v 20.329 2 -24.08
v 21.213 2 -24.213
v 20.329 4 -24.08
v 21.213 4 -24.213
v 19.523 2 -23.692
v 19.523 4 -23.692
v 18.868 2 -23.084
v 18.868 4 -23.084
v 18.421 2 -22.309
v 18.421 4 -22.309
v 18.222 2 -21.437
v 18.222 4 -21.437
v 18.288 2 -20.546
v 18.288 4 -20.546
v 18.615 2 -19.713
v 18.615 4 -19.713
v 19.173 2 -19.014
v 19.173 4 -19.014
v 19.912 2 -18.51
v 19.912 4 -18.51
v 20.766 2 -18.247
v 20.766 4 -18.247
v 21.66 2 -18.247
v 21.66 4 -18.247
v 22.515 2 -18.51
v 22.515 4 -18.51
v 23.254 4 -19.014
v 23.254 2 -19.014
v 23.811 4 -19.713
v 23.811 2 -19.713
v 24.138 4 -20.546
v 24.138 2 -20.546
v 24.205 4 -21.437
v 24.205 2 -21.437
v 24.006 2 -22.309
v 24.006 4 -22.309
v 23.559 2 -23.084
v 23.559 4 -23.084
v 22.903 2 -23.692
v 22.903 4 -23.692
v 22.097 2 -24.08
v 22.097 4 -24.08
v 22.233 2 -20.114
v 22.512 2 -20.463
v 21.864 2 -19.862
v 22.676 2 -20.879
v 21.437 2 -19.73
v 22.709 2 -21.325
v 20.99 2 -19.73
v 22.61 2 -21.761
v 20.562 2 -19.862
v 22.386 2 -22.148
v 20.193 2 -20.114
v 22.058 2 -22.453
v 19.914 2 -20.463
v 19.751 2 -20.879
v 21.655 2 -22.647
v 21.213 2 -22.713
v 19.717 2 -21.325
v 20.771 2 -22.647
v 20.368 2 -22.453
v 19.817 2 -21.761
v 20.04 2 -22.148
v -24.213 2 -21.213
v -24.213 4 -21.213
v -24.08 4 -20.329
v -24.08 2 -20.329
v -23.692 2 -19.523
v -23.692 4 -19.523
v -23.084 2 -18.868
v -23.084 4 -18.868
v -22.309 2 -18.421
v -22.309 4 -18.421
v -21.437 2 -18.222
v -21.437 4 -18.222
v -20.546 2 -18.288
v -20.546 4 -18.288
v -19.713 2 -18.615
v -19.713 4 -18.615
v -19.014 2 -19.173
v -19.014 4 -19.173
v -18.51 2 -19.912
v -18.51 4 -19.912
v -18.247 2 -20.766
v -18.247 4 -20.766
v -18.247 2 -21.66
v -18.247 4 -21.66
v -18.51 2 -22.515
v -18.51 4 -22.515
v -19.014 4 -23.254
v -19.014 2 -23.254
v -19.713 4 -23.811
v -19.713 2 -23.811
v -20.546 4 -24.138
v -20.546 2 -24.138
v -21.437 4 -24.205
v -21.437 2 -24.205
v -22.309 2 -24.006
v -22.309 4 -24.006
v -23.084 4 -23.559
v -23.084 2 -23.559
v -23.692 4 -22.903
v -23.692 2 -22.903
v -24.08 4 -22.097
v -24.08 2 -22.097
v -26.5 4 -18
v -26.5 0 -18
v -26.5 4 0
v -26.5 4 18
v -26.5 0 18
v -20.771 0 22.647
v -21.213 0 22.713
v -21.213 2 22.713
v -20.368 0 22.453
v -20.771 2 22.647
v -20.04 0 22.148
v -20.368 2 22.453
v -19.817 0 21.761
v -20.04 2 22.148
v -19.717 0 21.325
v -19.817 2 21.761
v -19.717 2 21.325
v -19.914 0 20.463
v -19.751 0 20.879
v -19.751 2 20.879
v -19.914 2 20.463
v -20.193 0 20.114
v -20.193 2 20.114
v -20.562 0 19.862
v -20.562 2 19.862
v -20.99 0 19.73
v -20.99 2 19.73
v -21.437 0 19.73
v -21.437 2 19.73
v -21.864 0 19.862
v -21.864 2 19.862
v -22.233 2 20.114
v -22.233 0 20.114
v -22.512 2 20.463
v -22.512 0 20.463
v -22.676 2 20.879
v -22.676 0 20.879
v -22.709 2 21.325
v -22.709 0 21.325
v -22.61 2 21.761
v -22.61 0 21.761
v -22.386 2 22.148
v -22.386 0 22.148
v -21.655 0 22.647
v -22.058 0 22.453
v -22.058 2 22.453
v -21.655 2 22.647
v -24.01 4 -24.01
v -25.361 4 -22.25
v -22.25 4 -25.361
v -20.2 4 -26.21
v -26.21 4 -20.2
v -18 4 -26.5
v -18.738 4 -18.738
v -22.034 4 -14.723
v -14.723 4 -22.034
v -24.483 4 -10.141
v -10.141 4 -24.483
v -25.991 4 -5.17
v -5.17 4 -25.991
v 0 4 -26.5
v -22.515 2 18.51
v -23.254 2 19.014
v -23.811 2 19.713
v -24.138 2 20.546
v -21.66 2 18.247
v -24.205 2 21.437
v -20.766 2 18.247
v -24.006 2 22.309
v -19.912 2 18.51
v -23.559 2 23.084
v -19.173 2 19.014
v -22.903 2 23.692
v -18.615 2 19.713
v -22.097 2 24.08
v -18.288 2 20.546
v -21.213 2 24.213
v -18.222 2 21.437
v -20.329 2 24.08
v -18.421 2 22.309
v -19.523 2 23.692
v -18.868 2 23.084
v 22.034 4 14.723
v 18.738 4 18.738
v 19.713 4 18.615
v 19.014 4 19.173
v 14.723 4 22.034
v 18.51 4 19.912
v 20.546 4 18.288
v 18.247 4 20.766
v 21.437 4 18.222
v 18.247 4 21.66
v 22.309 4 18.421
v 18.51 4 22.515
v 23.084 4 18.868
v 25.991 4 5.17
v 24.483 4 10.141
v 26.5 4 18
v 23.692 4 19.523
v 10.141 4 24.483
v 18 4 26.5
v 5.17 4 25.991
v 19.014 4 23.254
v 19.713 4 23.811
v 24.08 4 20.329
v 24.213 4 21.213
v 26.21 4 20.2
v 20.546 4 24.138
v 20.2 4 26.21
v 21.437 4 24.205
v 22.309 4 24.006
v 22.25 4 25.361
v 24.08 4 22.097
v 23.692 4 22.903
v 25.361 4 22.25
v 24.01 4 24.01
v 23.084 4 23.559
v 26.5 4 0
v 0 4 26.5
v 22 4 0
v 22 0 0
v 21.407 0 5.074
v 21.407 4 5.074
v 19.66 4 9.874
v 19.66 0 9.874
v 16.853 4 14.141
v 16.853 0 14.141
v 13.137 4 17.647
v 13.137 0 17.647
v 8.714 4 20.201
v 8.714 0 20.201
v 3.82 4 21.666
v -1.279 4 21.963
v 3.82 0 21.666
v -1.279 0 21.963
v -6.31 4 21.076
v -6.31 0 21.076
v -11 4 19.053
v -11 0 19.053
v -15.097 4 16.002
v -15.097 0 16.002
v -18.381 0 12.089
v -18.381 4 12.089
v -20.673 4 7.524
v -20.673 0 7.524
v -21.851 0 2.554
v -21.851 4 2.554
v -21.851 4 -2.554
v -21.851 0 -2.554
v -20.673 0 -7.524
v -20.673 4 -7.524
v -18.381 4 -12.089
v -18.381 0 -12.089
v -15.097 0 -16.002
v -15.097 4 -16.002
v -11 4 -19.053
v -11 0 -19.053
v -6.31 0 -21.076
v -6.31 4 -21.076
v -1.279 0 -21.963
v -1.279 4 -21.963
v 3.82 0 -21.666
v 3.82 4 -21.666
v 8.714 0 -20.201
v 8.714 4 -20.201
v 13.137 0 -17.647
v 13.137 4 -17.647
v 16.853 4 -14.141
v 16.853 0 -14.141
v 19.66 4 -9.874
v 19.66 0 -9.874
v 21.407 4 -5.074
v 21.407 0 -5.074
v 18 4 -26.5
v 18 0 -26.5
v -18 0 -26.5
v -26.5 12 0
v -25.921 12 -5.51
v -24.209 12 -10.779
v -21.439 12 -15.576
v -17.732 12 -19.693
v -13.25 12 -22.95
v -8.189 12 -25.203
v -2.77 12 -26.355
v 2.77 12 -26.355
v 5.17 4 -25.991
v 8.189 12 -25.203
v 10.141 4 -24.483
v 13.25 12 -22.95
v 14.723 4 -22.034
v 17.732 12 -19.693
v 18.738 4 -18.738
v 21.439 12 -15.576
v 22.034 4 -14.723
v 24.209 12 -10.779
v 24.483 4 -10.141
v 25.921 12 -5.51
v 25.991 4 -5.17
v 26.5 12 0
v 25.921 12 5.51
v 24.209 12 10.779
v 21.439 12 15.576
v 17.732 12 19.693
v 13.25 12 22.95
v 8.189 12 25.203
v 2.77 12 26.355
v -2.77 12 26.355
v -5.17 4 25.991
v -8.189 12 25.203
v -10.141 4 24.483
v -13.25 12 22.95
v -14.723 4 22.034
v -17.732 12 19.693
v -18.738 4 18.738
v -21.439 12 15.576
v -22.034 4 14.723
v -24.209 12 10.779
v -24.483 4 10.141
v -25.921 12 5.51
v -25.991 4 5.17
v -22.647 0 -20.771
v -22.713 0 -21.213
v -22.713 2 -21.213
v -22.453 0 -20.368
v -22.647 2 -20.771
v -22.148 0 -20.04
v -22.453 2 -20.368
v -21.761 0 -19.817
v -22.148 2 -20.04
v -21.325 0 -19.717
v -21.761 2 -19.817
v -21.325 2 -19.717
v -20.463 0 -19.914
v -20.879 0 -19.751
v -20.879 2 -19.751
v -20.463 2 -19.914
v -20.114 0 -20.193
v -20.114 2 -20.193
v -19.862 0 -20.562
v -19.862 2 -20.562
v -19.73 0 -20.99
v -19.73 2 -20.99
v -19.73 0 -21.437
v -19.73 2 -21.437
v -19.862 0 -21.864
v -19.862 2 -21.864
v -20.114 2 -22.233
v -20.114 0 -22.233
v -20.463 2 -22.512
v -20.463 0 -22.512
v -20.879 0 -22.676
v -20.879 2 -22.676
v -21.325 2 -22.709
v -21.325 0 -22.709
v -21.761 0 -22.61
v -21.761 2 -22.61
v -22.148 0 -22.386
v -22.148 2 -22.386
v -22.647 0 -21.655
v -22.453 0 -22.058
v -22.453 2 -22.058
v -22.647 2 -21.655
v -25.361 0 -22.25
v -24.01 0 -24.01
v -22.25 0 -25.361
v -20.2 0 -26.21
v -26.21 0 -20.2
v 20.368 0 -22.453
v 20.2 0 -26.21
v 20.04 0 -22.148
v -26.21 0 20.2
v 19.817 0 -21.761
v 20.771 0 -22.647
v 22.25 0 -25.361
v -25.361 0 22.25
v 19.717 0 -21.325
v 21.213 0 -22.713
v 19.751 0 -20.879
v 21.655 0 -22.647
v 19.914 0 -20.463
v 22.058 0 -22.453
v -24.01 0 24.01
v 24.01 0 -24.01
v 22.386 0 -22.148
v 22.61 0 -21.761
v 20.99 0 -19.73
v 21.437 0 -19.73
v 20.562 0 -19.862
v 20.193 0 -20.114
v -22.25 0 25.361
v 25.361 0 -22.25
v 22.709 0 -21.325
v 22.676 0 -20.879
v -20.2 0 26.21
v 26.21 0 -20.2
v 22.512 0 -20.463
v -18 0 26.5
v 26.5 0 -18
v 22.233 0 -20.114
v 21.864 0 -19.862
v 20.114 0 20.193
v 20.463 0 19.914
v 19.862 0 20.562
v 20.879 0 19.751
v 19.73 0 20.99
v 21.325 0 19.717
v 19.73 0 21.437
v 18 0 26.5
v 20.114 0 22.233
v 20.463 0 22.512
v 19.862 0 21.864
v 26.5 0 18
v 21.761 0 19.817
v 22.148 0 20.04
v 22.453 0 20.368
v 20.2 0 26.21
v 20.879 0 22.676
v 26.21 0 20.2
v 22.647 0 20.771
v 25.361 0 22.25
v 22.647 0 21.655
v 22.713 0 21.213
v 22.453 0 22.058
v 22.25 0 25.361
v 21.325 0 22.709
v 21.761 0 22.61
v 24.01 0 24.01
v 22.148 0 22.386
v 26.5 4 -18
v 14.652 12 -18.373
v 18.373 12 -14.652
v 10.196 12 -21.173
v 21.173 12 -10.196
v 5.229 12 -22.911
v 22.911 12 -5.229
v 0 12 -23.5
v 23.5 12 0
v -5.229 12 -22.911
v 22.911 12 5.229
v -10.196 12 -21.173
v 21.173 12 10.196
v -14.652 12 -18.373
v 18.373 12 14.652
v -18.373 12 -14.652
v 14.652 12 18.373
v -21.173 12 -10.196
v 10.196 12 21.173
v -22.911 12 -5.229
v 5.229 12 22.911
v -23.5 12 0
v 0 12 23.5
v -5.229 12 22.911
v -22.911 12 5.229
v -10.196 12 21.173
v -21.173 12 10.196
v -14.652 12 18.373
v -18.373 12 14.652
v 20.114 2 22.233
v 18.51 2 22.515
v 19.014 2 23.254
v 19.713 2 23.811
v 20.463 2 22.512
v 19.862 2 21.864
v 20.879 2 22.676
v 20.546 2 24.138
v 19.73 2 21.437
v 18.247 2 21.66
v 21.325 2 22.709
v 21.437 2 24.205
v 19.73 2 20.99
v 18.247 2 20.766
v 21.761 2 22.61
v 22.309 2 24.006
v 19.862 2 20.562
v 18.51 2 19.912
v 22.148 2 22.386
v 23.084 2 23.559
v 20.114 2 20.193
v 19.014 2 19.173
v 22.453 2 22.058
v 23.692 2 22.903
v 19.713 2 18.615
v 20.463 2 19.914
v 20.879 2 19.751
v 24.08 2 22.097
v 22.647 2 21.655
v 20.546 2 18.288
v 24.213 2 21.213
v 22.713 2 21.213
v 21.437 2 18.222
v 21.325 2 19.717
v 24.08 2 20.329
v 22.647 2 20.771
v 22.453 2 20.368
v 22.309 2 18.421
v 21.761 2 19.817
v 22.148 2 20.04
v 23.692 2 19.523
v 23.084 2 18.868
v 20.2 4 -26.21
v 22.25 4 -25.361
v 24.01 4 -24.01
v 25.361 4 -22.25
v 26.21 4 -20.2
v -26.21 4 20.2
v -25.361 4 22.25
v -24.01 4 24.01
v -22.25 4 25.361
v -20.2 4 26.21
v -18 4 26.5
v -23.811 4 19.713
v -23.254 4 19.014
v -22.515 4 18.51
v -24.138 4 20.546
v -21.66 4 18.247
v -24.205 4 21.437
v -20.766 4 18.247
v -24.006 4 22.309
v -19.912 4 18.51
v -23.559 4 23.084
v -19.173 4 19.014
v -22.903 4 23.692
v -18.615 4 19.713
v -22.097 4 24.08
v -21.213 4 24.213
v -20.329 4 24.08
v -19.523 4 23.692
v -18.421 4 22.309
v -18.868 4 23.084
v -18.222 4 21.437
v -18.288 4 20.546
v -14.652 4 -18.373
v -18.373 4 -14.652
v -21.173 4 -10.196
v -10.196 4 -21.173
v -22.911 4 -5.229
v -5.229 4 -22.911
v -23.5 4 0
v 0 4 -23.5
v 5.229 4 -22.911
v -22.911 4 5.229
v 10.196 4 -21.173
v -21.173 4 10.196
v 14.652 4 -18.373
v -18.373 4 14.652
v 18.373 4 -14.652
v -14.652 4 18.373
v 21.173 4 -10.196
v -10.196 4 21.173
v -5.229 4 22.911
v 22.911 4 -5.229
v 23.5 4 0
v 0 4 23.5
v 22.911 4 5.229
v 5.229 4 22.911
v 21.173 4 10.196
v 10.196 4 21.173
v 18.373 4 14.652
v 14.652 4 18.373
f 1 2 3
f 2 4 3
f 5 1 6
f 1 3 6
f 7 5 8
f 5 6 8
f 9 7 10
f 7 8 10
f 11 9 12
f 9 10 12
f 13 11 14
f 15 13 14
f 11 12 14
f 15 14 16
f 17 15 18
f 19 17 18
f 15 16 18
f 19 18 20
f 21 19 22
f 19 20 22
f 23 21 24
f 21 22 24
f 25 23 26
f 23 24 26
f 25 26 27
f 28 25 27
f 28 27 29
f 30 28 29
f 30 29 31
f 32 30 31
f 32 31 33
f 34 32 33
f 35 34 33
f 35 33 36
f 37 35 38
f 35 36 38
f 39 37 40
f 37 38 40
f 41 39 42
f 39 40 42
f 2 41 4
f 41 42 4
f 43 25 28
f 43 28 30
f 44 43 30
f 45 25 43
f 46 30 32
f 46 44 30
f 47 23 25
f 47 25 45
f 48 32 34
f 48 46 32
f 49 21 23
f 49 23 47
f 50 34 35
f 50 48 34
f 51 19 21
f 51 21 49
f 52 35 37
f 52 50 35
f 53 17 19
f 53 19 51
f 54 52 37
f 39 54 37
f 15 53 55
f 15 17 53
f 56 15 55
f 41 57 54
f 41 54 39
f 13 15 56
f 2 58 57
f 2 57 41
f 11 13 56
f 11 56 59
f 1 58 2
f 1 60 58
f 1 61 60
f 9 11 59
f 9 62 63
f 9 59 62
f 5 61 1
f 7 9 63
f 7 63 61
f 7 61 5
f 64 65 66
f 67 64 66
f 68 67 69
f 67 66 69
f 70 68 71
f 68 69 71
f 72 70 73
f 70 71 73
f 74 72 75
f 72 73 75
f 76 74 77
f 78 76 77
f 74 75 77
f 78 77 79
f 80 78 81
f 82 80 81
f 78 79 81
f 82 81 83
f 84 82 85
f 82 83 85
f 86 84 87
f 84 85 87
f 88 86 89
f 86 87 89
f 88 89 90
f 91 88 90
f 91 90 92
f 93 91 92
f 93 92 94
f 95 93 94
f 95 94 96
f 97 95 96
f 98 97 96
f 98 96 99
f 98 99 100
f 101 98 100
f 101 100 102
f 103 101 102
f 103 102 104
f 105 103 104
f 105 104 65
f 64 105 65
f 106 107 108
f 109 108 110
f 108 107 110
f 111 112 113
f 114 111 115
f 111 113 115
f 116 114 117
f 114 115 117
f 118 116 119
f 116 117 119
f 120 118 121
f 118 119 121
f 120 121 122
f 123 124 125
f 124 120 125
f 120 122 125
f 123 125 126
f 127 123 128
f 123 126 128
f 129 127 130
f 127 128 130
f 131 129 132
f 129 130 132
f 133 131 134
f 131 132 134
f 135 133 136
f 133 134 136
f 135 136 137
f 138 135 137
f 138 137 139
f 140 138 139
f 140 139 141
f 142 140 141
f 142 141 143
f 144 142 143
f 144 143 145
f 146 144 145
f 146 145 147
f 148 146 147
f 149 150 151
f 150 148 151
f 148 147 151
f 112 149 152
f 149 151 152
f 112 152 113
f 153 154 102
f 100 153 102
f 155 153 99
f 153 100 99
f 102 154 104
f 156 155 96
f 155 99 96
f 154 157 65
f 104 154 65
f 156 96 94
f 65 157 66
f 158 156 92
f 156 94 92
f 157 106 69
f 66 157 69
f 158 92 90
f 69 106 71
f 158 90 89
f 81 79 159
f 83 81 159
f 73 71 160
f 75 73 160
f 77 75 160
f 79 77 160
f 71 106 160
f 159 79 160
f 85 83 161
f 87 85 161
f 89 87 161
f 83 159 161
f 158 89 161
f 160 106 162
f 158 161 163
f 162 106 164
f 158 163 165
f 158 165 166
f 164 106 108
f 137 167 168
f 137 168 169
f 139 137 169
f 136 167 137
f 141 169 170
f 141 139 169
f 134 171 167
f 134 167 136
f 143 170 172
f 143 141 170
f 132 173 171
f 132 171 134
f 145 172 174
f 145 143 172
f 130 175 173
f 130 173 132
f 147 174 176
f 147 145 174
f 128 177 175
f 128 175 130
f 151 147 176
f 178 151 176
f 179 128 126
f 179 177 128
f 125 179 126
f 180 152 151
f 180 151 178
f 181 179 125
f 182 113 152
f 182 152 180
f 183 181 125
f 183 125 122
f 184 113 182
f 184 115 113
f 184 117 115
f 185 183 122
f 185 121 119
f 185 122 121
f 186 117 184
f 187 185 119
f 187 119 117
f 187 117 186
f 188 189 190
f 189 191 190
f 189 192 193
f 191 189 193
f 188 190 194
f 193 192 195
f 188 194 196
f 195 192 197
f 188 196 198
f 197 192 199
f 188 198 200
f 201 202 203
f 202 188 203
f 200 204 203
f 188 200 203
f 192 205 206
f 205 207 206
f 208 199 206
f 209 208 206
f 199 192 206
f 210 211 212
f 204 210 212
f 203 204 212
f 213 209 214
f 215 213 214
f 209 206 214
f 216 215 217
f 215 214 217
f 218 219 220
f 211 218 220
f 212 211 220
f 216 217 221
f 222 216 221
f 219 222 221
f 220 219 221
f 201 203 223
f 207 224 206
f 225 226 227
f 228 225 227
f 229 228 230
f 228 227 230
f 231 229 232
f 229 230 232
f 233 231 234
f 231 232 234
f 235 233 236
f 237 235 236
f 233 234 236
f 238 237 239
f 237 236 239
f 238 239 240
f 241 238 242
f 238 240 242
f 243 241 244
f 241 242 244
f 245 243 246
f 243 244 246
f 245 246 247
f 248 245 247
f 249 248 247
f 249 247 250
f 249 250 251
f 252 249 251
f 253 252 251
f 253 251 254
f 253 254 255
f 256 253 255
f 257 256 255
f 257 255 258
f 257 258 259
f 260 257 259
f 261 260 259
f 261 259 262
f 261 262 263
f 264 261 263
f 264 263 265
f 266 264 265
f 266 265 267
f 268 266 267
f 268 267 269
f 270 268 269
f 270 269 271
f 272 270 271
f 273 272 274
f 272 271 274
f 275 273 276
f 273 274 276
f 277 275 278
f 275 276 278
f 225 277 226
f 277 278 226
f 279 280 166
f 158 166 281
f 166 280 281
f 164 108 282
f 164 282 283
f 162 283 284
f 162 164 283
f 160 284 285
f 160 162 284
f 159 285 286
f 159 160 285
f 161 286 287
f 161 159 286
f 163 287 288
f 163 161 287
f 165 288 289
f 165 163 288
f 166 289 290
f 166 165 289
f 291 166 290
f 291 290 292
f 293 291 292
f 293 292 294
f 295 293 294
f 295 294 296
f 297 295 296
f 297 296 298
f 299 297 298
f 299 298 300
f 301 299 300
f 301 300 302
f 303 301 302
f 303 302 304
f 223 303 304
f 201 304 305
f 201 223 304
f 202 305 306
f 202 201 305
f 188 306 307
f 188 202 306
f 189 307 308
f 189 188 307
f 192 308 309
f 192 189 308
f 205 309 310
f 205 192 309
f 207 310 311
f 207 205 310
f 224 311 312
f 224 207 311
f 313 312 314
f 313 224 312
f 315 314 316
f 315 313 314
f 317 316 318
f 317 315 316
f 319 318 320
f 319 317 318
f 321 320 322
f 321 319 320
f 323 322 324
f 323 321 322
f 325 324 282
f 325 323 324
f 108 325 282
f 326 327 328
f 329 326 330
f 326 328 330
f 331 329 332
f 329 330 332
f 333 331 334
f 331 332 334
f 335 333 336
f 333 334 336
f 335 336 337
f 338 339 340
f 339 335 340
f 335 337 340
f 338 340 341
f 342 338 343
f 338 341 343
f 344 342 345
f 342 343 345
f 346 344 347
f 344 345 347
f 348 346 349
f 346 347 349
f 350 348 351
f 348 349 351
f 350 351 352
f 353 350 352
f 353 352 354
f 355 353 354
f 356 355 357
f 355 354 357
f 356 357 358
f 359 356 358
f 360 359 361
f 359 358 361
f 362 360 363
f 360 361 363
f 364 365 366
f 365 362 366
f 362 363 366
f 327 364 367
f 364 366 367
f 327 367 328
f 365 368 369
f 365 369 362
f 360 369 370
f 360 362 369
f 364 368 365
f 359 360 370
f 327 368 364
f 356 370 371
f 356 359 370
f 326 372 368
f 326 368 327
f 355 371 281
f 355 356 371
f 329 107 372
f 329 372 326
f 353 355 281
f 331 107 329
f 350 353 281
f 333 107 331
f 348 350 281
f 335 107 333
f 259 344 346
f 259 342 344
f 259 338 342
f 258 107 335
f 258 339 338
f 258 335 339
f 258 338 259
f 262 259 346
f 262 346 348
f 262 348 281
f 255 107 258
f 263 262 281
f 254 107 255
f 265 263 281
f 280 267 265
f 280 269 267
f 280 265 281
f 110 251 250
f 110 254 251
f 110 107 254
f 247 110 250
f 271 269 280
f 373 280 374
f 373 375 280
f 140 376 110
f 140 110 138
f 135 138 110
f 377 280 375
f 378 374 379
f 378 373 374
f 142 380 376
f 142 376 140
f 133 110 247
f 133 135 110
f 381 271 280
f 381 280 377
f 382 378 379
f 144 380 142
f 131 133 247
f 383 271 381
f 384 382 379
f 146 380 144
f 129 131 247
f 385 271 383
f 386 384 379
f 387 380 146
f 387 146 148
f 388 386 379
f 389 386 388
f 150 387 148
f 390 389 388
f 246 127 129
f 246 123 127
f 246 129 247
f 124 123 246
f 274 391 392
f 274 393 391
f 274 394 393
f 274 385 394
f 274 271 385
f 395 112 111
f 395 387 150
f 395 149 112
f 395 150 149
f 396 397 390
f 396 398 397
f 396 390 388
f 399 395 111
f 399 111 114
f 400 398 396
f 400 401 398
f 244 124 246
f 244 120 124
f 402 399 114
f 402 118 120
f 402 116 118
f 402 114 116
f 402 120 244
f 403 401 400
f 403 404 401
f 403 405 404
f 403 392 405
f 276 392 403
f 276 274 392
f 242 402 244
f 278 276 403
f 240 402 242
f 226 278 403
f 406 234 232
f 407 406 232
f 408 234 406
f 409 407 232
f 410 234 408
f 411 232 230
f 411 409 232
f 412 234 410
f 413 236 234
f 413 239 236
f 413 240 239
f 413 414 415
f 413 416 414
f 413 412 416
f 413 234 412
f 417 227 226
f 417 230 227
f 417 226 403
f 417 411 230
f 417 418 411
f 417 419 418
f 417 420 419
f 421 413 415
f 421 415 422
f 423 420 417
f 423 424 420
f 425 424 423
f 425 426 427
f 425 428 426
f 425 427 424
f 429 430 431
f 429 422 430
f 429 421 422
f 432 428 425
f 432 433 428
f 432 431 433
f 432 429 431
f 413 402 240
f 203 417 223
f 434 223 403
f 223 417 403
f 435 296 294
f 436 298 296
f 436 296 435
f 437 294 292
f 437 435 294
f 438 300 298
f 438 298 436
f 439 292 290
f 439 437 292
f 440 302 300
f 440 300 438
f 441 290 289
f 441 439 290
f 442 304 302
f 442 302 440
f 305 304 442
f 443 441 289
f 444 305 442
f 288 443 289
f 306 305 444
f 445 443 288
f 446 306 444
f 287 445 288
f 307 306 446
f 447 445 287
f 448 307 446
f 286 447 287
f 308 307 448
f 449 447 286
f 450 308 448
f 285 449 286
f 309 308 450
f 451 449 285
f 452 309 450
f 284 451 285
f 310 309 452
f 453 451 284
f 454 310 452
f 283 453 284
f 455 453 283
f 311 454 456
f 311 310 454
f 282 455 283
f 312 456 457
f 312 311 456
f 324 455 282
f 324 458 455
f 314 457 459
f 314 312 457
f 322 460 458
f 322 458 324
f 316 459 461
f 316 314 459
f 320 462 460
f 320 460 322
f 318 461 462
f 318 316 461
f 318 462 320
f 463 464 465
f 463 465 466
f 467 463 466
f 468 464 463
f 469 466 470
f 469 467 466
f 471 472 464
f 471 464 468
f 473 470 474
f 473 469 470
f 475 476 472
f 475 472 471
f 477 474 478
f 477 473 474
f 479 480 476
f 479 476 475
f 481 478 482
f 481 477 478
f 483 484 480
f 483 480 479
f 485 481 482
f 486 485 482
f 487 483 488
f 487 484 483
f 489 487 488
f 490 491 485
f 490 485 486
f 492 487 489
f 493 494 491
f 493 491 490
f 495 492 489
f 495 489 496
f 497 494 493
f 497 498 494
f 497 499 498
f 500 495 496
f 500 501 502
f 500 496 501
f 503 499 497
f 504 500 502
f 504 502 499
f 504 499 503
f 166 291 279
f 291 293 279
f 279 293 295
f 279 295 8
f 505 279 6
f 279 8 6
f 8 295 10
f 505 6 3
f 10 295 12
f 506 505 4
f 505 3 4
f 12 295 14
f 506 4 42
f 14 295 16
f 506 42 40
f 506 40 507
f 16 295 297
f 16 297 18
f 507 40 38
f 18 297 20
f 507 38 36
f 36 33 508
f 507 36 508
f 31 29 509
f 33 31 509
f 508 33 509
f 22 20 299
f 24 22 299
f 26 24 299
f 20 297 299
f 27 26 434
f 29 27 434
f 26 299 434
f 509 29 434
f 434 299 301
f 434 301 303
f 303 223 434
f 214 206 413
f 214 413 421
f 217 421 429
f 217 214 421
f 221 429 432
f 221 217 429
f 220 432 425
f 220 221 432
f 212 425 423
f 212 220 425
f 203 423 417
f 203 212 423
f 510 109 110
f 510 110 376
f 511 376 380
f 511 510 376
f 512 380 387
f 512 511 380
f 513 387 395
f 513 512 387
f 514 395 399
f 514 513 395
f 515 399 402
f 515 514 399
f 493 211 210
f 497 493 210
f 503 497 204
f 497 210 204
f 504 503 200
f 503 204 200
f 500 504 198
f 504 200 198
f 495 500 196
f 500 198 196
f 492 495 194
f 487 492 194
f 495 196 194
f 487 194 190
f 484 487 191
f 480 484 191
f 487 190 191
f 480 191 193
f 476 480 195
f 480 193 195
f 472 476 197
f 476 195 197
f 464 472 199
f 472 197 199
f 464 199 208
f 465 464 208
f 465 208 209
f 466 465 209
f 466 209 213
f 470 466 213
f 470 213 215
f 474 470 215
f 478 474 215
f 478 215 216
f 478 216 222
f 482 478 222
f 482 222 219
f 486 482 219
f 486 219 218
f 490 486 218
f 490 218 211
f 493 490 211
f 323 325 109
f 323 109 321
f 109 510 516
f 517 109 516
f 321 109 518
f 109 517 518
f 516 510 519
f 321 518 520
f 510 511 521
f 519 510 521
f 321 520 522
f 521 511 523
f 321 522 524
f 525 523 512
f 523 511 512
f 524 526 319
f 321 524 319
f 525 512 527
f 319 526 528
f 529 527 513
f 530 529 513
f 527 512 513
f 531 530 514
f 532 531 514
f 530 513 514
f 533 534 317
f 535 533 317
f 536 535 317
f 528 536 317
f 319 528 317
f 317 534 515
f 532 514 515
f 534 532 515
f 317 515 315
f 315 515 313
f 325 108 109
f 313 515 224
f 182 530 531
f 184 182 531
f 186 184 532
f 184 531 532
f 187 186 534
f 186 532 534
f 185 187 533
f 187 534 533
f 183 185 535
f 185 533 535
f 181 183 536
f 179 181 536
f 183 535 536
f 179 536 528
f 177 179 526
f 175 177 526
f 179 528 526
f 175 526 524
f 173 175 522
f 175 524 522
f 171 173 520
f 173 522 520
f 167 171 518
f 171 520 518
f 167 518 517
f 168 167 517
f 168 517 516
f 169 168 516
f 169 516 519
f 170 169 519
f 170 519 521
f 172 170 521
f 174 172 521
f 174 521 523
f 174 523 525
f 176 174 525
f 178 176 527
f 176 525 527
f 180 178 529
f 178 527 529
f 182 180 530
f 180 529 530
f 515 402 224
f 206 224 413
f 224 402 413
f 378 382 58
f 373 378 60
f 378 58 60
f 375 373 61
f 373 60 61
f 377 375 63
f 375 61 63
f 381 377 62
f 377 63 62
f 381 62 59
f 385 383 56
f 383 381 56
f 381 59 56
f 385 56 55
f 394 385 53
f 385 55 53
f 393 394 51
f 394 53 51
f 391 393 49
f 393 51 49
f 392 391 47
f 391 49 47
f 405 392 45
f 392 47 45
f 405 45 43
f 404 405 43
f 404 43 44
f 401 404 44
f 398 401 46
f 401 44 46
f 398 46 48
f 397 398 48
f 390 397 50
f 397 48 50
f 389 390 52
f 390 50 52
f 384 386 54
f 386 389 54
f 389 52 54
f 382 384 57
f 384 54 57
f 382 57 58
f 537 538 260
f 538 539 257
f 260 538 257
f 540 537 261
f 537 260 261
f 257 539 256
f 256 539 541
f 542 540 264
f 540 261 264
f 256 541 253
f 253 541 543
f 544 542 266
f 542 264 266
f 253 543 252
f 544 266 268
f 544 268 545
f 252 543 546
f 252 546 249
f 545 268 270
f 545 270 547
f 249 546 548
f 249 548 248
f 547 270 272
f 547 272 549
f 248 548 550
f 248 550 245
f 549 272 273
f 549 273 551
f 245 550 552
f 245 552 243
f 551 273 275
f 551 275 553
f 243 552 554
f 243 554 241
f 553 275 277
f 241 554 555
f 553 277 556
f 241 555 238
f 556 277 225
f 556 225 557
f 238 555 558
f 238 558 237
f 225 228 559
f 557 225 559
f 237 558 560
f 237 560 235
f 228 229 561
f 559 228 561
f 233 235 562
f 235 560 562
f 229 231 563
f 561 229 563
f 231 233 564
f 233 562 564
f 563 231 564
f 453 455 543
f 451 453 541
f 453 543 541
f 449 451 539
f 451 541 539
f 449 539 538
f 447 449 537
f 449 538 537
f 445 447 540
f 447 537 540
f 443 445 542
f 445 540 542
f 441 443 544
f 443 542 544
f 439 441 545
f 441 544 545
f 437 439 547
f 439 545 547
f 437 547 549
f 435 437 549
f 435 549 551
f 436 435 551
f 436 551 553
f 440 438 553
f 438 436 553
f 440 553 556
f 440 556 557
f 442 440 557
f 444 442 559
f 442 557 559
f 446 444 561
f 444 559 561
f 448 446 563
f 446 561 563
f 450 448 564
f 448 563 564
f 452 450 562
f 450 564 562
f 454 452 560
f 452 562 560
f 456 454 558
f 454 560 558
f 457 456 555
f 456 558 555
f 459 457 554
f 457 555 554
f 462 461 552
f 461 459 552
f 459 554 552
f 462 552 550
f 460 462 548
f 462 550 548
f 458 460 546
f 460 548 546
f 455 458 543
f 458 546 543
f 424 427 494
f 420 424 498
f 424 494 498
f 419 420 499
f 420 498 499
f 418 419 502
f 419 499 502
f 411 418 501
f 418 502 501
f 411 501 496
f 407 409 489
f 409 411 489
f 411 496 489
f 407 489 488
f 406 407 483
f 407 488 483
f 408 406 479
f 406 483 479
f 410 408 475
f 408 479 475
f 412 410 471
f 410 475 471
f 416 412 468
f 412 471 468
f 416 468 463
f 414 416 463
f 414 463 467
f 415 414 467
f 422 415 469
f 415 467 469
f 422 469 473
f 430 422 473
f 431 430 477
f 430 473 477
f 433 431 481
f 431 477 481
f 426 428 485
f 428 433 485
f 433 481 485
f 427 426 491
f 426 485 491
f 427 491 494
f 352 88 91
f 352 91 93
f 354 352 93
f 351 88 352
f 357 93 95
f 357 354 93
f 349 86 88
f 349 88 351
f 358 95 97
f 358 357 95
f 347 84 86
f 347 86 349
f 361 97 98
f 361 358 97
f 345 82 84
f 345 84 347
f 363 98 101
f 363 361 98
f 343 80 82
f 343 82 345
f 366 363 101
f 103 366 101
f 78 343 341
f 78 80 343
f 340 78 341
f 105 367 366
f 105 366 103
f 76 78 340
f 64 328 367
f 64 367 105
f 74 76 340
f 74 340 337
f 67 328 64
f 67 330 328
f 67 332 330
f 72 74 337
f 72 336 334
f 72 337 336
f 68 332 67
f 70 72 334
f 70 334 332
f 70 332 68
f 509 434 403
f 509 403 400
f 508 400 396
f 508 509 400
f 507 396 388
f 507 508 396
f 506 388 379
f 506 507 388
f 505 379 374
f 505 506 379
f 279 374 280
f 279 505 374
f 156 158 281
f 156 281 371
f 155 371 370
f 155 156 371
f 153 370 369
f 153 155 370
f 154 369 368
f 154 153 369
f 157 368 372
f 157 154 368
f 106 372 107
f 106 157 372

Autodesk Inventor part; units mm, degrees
ref_plane "YZ Plane" through (0, 0, 0) normal (1, 0, 0) x (0, 1, 0)
ref_plane "XZ Plane" through (0, 0, 0) normal (0, 1, 0) x (-1, 0, 0)
ref_plane "XY Plane" through (0, 0, 0) normal (0, 0, 1) x (1, 0, 0)
sketch "Эскиз1" plane through (0, 0, 0) normal (0, 1, 0) x (-1, 0, 0)
  circle A0 centre (0, 0) radius 22
  circle A1 centre (0, 0) radius 23.5
  circle A2 centre (0, 0) radius 26.5
  dimension "d0" = 44
  dimension "d1" = 47
  dimension "d2" = 53
extrude "Выдавливание1" add sketch "Эскиз1" along normal blind 12 contours A2
sketch "Эскиз2" plane through (0, 0, 0) normal (0, -1, 0) x (1, 0, 0)
  circle A0 centre (0, 0) radius 22
  circle A1 centre (0, 0) radius 23.5
  circle A2 centre (0, 0) radius 26.5
  dimension "d5" = 44
  dimension "d6" = 47
  dimension "d7" = 53
extrude "Выдавливание2" add sketch "Эскиз2" against normal blind 4 contours A1
sketch "Эскиз3" plane through (0, 0, 0) normal (0, -1, 0) x (1, 0, 0)
  circle A0 centre (0, 0) radius 22
  circle A1 centre (0, 0) radius 23.5
  circle A2 centre (0, 0) radius 26.5
  line L0 (-26.5, 26.5) -> (26.5, 26.5)
  line L1 (26.5, 26.5) -> (26.5, -26.5)
  line L2 (26.5, -26.5) -> (-26.5, -26.5)
  line L3 (-26.5, -26.5) -> (-26.5, 26.5)
  line L4 (-26.5, 26.5) -> (26.5, -26.5) construction
  line L5 (26.5, 26.5) -> (-26.5, -26.5) construction
  dimension "d10" = 44
  dimension "d11" = 47
  dimension "d12" = 53
  dimension "d13" = 53
  dimension "d14" = 53
extrude "Выдавливание3" add sketch "Эскиз3" against normal blind 4 contours L1 L2 A2 | A2 L0 L1 | A2 L3 L0 | L2 L3 A2
sketch "Эскиз4" plane through (0, 4, 0) normal (0, 1, 0) x (1, 0, 0)
  line L0 (0, 0) -> (21.2132, -21.2132)
  line L1 (0, 0) -> (30, 0) construction
  circle A0 centre (21.2132, -21.2132) radius 1.5
  dimension "d17" = 30
  dimension "d18" = 45
  dimension "d19" = 3
extrude "Выдавливание4" cut sketch "Эскиз4" against normal blind 4
pattern_circular "Круговой массив1" count 4 over 360 about axis through (0, -10, 0) along (0, 1, 0) of "Выдавливание4"
sketch "Эскиз5" plane through (0, 4, 0) normal (0, 1, 0) x (1, 0, 0)
  circle A0 centre (21.2132, -21.2132) radius 1.5 projected
  circle A1 centre (21.2132, -21.2132) radius 3
  point P0 (0, 0)
  dimension "d25" = 6
extrude "Выдавливание5" cut sketch "Эскиз5" against normal blind 2
pattern_circular "Круговой массив2" count 4 over 360 about axis through (0, -10, 0) along (0, 1, 0) of "Выдавливание5"
fillet "Сопряжение1" radius 8.5 4 edges at (26.5, 2, -26.5) (26.5, 2, 26.5) (-26.5, 2, -26.5) (-26.5, 2, 26.5)
sketch "Эскиз6" plane through (0, 0, 0) normal (0, -1, 0) x (1, 0, 0)
  arc A0 (-18, 26.5) -> (-26.5, 18) centre (-18, 18) ccw projected
  line L0 (-26.5, -18) -> (-26.5, 18) projected
  arc A1 (-26.5, -18) -> (-18, -26.5) centre (-18, -18) ccw projected
  line L1 (18, -26.5) -> (-18, -26.5) projected
  arc A2 (18, -26.5) -> (26.5, -18) centre (18, -18) ccw projected
  line L2 (26.5, 18) -> (26.5, -18) projected
  arc A3 (26.5, 18) -> (18, 26.5) centre (18, 18) ccw projected
  line L3 (-18, 26.5) -> (18, 26.5) projected
  circle A4 centre (-21.2132, 21.2132) radius 1.5 projected
  circle A5 centre (-21.2132, -21.2132) radius 1.5 projected
  circle A6 centre (21.2132, -21.2132) radius 1.5 projected
  circle A7 centre (21.2132, 21.2132) radius 1.5 projected
  circle A8 centre (0, 0) radius 22 projected
properties part number "000.001 - База лидара gjl gjlibgybr" material "Пластик АБС"
